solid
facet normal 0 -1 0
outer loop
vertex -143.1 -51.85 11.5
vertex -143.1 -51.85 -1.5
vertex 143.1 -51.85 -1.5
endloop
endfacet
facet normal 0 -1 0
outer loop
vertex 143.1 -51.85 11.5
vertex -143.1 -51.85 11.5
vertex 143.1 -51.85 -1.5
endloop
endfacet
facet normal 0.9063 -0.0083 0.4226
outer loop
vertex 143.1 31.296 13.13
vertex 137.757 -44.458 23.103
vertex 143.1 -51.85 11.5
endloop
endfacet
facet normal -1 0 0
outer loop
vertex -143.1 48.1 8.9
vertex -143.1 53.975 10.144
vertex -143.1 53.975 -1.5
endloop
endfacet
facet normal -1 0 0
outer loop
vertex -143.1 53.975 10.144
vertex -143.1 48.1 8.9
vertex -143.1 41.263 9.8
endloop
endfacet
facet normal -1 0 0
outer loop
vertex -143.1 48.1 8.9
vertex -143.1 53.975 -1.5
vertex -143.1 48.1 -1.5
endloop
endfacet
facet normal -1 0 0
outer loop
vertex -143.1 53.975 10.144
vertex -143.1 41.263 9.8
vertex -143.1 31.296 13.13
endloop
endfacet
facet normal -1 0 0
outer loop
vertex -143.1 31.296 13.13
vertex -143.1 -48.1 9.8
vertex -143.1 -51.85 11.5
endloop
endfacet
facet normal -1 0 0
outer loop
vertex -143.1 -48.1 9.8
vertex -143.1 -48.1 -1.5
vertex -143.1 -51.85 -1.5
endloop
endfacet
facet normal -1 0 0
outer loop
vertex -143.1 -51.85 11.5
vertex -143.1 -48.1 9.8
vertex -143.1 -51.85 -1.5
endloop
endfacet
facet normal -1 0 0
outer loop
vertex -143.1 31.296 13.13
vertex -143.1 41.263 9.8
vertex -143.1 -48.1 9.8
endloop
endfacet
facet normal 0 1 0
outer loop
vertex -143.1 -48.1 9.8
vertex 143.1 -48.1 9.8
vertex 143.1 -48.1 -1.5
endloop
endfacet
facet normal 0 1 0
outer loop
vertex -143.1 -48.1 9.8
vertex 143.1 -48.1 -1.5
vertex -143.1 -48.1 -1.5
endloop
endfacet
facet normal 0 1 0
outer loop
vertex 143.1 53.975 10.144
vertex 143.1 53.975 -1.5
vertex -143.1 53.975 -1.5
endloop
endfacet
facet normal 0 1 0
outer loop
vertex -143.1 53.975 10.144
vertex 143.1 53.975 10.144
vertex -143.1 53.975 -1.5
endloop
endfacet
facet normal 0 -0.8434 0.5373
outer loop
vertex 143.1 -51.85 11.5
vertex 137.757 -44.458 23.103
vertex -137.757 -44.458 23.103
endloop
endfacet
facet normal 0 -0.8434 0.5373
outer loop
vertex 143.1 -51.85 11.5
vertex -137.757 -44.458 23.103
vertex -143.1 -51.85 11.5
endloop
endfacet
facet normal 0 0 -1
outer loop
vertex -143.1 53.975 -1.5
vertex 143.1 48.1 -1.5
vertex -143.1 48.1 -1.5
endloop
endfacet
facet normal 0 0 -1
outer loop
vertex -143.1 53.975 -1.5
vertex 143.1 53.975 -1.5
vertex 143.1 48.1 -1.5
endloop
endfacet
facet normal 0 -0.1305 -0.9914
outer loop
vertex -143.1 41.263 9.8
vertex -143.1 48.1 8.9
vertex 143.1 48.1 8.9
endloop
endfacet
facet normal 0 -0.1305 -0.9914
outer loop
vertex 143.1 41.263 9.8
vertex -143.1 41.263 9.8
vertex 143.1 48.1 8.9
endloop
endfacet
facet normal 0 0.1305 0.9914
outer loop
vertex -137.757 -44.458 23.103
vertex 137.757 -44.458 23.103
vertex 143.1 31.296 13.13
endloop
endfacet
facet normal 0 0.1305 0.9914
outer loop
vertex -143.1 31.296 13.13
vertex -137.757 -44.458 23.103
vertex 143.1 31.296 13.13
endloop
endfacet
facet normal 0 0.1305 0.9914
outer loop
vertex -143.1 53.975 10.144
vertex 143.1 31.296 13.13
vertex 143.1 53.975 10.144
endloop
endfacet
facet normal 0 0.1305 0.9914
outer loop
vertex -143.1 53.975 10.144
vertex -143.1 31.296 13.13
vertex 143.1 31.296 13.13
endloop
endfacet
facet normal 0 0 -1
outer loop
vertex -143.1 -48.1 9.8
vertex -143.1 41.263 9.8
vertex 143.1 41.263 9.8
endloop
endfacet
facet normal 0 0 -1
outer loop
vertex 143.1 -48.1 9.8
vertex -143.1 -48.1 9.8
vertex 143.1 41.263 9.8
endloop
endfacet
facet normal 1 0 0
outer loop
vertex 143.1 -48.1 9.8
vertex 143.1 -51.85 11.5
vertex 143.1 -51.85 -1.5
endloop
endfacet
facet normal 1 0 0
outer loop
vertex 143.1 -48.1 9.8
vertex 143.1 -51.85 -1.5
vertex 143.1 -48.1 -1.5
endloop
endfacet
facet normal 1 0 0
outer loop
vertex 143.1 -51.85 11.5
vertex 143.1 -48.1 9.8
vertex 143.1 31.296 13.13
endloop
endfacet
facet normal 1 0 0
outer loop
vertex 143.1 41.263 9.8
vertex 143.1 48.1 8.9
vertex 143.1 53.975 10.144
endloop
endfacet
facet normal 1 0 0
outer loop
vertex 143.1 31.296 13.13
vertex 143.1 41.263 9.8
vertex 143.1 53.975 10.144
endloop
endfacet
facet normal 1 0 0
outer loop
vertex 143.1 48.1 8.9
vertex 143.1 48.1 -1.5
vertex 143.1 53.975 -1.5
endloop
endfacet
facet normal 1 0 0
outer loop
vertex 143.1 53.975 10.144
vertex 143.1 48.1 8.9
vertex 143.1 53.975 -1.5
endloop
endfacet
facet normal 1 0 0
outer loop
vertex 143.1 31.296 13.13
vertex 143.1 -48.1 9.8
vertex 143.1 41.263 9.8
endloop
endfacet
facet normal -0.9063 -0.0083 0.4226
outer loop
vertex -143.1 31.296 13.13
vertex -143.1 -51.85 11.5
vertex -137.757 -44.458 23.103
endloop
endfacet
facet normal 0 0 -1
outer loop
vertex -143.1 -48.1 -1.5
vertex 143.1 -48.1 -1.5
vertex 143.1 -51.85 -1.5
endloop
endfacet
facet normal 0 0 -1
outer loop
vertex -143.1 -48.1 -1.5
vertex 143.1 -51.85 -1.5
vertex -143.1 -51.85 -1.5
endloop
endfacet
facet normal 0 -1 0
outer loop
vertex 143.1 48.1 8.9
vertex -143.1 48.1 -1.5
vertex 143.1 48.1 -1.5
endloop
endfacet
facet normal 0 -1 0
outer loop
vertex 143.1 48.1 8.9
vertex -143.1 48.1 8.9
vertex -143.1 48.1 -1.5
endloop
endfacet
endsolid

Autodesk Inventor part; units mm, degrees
ref_plane "Work Plane1" through (0, 0, 9.8) normal (0, 0, 1) x (1, 0, 0)
sketch "Sketch1" plane through (0, 0, 9.8) normal (0, 0, 1) x (1, 0, 0)
  line L0 (145.35, 54.1) -> (-145.35, 54.1) projected
  line L1 (145.35, -54.1) -> (145.35, 54.1) projected
  line L2 (-145.35, -54.1) -> (145.35, -54.1) projected
  line L3 (-145.35, 54.1) -> (-145.35, -54.1) projected
  line L4 (143.1, 53.975) -> (-143.1, 53.975)
  line L5 (-143.1, 53.975) -> (-143.1, -51.85)
  line L6 (-143.1, -51.85) -> (143.1, -51.85)
  line L7 (143.1, -51.85) -> (143.1, 53.975)
  point P0 (0, 0)
  dimension "d0" = 0.125
  dimension "d1" = 2.25
  dimension "d2" = 2.25
  dimension "d3" = 2.25
ref_plane "Work Plane2" through (-147.35, 31.7362, 13.0715) normal (0, 0.1305262, 0.9914449) x (1, 0, 0)
extrude "Extrusion1" add sketch "Sketch1" along normal up to surface contours L7 L6 L5 L4 surface through (-147.35, 31.7362, 13.0715) normal (0, 0.1305262, 0.9914449)
sketch "Sketch3" plane through (0, 0, 9.8) normal (0, 0, -1) x (-1, 0, 0)
  line L0 (143.1, 48.1) -> (-143.1, 48.1)
  line L1 (-143.1, -51.85) -> (-143.1, 53.975) projected
  line L2 (-143.1, -48.1) -> (143.1, -48.1)
  line L3 (143.1, 53.975) -> (143.1, -51.85) projected
  line L4 (-143.1, 53.975) -> (143.1, 53.975) projected
  line L5 (143.1, -51.85) -> (-143.1, -51.85) projected
  point P0 (0, 0)
  dimension "d8" = 5.875
  dimension "d9" = 3.75
ref_plane "Work Plane3" through (-145.35, -54.1, -1.5) normal (0, 0, 1) x (1, 0, 0)
extrude "Extrusion2" add sketch "Sketch3" along normal up to surface (11.3 mm away) contours L0 L1 L4 L3 | L3 L5 L1 L2
sketch "Sketch4" plane through (-143.1, -48.1, 9.8) normal (-1, 0, 0) x (0, 0, 1)
  line L0 (14.2758, -3.75) -> (0.3437, 102.075) projected
  line L1 (13.3027, 3.6417) -> (1.7, -3.75)
  line L2 (-11.3, -3.75) -> (14.2758, -3.75) projected
  line L3 (0.7, -6) -> (0.7, -8) projected
  point P0 (-9.8, 48.1)
  dimension "d12" = 65
  dimension "d23" = 1
extrude "Extrusion3" cut sketch "Sketch4" against normal through all
sketch "Sketch5" plane through (-143.1, -51.85, -1.5) normal (0, -1, 0) x (1, 0, 0)
  line L0 (0, 13) -> (0, 24.6027) projected
  line L1 (0, 13) -> (5.4104, 24.6027)
  line L2 (0, 24.6027) -> (286.2, 24.6027) projected
  point P0 (143.1, 1.5)
  dimension "d15" = 65
sketch "Sketch6" plane through (-143.1, -48.1, 9.8) normal (-1, 0, 0) x (0, 0, 1)
  line L0 (1.7, -3.75) -> (3.3295, 79.3957)
  point P0 (-9.8, 48.1)
  point P1 (0.3437, 102.075)
  dimension "d16" = 22.875
sweep "Sweep1" cut profiles "Sketch5" path "Sketch6"
mirror "Mirror1" about plane through (0, 0, 0) normal (1, 0, 0) of "Sweep1"
ref_plane "Work Plane4" through (-143.1, 53.7139, 8.1608) normal (0, 0.1305262, 0.9914449) x (1, 0, 0)
sketch "Sketch8" plane through (-143.1, 53.975, 10.1437) normal (0, 0.1305262, 0.9914449) x (1, 0, 0)
  line L0 (286.2, 0) -> (286.2, -22.875) projected
  line L1 (286.2, -15) -> (0, -15)
  line L2 (0, -22.875) -> (0, 0) projected
  line L3 (0, 0) -> (286.2, 0) projected
  point P0 (143.1, -52.1892)
  dimension "d20" = 15
extrude "Extrusion4" add sketch "Sketch8" against normal up to surface (2 mm away)
sketch "Sketch9" plane through (-143.1, -51.85, -1.5) normal (0, -1, 0) x (1, 0, 0)
  line L0 (286.2, 0) -> (286.2, 11.6437) projected
  line L1 (286.2, 3) -> (0, 3)
  line L2 (0, 10.3999) -> (0, 0) projected
  line L3 (286.2, 0) -> (0, 0) projected
  point P0 (143.1, 1.5)
  dimension "d24" = 3
properties part number "bottom"
